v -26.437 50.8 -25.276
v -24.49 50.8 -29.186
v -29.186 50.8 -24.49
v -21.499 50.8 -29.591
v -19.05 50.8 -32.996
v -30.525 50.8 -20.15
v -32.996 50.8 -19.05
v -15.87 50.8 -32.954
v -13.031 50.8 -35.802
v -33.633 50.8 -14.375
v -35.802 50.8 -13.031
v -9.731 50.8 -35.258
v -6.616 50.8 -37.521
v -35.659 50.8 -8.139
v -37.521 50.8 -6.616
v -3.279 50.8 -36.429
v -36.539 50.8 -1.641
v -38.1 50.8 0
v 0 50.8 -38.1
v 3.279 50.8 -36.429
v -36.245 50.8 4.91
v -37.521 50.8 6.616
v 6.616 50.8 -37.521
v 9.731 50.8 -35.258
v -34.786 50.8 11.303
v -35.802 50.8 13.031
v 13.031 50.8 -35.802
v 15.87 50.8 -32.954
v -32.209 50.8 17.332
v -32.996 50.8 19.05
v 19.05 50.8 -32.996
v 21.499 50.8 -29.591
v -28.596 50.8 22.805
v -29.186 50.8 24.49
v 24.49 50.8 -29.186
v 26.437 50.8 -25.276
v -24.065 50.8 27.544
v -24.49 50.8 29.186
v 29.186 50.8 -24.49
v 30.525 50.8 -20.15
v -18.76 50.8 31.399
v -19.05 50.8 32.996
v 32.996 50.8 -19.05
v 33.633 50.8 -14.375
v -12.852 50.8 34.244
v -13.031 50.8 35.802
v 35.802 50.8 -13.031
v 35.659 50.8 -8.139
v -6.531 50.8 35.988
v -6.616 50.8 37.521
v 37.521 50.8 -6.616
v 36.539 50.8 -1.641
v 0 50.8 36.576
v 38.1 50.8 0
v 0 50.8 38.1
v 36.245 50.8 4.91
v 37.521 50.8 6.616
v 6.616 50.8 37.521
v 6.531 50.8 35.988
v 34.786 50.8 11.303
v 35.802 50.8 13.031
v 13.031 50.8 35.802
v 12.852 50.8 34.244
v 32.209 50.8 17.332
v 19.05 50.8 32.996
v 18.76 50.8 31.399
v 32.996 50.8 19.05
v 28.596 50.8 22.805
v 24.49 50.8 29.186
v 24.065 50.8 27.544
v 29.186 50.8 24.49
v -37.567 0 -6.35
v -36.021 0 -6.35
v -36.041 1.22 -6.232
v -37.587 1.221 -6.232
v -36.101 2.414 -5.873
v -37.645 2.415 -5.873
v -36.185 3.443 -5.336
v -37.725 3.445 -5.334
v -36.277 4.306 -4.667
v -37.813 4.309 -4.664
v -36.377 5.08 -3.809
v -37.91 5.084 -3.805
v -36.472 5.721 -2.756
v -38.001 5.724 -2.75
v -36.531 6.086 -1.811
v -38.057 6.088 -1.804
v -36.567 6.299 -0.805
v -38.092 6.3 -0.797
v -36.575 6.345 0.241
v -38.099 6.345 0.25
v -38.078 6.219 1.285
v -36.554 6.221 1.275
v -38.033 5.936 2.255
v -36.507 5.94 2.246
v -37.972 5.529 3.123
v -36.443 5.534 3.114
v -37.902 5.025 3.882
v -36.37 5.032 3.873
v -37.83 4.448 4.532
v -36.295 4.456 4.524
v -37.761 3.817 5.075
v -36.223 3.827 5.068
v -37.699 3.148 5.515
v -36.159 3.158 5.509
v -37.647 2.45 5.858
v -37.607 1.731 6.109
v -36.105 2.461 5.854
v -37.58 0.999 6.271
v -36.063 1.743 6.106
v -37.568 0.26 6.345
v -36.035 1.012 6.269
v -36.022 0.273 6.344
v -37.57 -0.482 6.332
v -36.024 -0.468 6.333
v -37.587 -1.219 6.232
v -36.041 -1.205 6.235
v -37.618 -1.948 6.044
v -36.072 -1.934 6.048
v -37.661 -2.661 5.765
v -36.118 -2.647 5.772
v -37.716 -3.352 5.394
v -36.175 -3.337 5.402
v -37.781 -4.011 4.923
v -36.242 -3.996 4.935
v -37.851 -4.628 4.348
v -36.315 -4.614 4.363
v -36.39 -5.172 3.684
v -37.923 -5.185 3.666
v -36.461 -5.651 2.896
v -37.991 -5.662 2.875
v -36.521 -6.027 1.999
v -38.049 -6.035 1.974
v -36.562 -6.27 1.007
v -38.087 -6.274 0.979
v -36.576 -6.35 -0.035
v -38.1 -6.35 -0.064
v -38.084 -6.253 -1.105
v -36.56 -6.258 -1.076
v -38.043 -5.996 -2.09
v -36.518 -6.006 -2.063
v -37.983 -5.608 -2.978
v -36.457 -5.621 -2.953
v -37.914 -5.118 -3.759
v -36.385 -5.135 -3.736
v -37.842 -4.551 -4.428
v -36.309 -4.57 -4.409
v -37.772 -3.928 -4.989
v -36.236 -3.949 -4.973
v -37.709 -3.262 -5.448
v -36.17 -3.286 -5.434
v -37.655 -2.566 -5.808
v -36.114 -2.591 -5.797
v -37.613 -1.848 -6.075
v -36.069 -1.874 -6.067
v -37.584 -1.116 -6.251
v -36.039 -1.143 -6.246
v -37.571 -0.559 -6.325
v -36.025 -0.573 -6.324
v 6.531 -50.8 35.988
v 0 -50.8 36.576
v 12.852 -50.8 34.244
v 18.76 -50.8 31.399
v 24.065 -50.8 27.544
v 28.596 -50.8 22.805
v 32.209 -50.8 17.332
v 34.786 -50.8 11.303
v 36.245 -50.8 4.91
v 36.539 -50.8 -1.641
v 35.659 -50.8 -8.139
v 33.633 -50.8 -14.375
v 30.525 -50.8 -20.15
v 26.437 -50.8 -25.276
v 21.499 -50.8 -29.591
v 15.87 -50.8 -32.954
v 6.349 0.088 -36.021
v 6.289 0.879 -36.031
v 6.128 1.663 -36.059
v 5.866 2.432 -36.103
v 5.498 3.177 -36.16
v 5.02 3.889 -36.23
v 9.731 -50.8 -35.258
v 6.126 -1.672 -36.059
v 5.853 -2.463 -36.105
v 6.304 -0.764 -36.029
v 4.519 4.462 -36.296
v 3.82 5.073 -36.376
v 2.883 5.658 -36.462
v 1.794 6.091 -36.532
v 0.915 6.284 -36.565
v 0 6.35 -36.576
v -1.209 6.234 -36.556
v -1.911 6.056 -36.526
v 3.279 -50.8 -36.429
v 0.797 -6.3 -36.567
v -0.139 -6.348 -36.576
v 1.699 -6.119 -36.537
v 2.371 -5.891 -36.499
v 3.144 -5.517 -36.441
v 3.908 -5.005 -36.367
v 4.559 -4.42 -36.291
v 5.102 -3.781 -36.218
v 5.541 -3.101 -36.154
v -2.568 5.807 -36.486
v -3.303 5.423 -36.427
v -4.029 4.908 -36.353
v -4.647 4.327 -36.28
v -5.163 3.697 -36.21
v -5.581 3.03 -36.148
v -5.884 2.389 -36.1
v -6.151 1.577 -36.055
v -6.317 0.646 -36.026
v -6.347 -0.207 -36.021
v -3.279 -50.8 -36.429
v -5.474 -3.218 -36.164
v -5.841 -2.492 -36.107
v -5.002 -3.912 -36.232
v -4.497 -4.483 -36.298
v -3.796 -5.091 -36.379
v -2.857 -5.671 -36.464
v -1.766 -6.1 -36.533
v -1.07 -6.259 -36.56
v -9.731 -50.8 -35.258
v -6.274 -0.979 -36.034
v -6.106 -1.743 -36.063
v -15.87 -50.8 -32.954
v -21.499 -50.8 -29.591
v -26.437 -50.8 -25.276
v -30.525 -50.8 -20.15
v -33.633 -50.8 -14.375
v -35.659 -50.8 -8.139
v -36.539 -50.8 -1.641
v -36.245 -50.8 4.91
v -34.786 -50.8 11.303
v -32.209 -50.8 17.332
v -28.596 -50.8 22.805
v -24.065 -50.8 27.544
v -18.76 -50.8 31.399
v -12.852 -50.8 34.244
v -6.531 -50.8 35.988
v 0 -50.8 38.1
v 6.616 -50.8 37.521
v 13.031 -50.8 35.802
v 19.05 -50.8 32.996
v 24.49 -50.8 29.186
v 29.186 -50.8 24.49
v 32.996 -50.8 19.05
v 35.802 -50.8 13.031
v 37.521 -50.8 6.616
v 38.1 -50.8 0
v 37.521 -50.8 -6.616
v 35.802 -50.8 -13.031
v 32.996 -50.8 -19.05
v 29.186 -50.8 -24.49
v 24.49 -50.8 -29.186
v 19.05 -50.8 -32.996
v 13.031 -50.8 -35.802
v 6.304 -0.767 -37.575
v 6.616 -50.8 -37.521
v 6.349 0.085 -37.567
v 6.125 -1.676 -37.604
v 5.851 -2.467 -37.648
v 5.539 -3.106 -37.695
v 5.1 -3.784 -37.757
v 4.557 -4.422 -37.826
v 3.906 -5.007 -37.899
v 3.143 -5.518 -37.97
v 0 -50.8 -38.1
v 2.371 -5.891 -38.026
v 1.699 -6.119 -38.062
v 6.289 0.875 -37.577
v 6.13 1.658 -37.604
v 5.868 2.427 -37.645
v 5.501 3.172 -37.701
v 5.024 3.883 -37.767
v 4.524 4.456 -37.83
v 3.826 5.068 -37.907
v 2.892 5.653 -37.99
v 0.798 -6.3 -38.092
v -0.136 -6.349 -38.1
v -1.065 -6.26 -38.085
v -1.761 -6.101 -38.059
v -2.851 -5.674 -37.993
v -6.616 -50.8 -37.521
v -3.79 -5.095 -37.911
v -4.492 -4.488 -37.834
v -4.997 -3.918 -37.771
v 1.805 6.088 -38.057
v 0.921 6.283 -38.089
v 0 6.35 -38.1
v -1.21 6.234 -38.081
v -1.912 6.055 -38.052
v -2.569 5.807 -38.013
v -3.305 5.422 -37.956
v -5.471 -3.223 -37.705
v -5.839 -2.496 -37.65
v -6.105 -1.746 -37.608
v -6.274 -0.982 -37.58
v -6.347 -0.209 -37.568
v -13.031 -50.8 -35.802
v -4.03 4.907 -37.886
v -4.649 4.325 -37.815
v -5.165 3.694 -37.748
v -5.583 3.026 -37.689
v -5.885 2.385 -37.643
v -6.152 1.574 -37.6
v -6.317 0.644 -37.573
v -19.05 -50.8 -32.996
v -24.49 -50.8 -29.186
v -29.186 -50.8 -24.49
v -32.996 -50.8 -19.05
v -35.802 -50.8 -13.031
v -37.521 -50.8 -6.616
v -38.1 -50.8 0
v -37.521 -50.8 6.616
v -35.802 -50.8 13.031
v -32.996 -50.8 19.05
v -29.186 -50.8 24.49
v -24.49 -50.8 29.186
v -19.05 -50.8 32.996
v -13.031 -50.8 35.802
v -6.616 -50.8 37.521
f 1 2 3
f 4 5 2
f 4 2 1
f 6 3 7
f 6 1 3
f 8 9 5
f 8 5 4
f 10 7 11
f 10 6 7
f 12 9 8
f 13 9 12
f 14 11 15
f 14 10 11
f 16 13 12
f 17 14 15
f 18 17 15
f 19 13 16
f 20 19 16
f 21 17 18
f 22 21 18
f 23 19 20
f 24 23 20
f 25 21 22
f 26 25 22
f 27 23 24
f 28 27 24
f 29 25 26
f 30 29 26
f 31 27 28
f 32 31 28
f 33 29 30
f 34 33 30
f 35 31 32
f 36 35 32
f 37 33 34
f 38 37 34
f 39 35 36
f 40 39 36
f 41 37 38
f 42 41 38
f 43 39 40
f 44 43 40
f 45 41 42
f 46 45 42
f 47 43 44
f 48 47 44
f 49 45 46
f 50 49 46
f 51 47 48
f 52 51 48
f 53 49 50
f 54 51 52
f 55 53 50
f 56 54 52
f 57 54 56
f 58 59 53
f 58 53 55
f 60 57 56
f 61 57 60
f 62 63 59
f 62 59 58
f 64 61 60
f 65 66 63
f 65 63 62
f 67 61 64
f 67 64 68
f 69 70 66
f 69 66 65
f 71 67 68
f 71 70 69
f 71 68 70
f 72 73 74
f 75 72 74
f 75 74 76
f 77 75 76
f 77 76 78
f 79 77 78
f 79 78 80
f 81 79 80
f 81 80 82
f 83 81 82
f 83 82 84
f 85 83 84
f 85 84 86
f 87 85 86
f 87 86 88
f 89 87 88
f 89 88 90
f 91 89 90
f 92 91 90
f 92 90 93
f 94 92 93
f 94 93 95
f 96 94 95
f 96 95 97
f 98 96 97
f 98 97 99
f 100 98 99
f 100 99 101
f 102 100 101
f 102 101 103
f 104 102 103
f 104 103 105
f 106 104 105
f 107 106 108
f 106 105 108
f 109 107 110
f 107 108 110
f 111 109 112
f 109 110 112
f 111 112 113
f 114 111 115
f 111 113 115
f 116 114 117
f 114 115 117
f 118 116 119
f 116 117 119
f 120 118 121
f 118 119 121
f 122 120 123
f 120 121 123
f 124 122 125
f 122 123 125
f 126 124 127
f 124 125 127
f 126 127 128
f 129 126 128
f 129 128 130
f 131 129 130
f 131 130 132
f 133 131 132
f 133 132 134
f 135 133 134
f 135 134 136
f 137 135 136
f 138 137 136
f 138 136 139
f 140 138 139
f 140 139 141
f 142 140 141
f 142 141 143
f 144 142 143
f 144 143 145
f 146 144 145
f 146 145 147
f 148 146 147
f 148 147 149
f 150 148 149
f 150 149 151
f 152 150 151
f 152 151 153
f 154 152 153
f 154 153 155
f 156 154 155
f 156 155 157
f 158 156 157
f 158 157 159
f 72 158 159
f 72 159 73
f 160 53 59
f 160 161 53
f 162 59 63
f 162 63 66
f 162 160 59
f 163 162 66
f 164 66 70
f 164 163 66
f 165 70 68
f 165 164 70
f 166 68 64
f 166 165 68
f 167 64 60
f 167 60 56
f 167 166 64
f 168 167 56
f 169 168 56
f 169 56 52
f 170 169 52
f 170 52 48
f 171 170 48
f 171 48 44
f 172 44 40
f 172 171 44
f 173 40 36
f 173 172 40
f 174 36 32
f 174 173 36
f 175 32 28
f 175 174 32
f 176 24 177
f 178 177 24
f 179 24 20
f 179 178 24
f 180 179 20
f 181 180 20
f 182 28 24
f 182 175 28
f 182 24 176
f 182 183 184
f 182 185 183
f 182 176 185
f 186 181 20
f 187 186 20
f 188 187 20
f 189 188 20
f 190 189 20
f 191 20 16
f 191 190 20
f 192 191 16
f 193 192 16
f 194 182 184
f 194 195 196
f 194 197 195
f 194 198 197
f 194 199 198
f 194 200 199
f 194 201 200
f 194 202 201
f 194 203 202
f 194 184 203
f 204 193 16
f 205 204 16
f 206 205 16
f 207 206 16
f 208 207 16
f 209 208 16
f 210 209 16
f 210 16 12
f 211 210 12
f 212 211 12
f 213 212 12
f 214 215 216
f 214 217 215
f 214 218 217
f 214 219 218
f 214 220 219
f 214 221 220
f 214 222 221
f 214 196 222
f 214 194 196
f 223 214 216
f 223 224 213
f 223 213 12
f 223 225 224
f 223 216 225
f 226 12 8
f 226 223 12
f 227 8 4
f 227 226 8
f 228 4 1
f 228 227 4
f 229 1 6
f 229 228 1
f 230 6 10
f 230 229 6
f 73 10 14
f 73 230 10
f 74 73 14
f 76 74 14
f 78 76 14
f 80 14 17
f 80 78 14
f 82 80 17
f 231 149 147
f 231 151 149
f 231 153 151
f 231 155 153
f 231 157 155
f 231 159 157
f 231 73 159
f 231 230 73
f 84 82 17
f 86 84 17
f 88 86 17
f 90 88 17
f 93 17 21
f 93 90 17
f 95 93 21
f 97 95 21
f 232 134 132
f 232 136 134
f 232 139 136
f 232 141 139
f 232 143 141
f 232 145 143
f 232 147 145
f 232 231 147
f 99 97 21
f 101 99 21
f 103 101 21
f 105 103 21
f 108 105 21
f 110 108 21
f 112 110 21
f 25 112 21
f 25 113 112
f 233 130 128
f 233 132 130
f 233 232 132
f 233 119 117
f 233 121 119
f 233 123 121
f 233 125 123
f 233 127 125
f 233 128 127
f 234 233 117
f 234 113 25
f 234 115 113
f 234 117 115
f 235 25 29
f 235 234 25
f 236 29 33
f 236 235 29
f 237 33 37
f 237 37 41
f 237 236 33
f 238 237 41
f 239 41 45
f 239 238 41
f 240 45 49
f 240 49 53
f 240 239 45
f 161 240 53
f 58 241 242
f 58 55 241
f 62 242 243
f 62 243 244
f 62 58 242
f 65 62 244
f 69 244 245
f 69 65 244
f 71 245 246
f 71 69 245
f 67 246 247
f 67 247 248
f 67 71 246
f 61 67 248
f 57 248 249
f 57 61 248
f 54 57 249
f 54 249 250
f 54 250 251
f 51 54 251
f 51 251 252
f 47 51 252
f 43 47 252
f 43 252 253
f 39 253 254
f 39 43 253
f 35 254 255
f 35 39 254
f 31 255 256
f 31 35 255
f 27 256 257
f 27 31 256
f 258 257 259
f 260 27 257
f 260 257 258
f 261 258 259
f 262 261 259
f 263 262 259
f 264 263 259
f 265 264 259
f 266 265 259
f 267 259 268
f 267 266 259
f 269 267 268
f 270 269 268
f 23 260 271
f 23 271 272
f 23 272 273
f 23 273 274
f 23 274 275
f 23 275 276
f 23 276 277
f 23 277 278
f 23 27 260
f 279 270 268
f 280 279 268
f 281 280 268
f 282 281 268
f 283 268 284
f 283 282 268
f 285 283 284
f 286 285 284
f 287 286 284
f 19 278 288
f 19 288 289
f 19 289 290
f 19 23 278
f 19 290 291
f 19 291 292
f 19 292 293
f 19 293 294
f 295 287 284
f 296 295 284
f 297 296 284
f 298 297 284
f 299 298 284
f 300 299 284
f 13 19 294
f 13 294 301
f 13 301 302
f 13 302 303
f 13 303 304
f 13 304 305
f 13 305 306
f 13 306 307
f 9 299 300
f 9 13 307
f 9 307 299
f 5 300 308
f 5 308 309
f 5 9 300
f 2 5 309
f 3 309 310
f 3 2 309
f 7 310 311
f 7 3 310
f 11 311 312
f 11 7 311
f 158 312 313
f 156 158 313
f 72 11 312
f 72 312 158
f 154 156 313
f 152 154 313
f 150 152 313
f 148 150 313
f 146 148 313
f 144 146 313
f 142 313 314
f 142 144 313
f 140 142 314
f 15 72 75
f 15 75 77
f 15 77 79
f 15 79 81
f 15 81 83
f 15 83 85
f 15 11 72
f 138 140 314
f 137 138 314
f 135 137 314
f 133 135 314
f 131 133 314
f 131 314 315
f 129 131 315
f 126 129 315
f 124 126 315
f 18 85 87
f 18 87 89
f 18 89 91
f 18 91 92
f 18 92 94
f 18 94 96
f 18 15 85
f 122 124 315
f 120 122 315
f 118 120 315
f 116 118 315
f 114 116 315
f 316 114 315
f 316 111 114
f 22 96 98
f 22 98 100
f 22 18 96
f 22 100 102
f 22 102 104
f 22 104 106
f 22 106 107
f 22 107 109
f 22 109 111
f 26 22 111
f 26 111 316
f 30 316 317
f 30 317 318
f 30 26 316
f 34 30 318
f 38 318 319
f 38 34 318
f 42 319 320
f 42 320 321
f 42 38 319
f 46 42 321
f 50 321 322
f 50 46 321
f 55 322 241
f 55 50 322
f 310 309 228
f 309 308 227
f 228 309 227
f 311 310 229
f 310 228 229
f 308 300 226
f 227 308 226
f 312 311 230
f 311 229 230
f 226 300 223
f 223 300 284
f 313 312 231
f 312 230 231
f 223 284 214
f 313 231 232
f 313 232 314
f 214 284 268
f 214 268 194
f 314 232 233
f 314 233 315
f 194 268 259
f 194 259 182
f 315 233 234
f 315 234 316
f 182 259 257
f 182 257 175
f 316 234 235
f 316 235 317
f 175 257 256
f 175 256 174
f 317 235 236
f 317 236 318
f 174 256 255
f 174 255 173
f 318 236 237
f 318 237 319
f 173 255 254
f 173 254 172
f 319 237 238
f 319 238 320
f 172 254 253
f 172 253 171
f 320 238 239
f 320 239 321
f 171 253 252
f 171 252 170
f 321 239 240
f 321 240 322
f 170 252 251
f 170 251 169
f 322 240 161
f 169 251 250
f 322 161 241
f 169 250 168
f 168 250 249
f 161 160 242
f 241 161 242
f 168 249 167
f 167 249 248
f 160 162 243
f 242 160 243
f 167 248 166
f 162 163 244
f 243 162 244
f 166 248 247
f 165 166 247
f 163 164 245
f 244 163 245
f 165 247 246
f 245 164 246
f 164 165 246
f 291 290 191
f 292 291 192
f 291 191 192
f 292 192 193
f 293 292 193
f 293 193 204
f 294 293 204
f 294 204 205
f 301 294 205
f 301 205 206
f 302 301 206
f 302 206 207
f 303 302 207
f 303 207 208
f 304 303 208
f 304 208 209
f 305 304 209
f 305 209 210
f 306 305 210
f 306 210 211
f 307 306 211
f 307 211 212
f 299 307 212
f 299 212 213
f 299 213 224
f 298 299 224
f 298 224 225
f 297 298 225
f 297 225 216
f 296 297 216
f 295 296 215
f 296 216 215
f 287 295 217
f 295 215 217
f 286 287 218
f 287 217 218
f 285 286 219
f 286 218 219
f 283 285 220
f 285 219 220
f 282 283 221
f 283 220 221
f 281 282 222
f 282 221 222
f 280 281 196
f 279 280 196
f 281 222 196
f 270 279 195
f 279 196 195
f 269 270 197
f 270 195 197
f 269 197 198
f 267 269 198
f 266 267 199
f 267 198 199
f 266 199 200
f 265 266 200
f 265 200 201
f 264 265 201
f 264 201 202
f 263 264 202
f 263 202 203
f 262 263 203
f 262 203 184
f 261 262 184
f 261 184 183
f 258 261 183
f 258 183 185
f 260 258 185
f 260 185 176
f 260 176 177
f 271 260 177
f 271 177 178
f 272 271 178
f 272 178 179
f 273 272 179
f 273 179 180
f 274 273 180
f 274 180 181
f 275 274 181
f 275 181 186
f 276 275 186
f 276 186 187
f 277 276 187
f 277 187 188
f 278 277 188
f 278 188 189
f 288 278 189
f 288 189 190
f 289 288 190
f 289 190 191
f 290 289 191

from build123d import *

# Parameters (mm, degrees)
SKETCH1_R           = 38.1
SKETCH1_R_2         = 36.576
BOSS_EXTRUDE1_DEPTH = 50.8
SKETCH2_R           = 6.35
CUT_EXTRUDE1_DEPTH  = 75.053089065
SKETCH3_R           = 6.35
CUT_EXTRUDE2_DEPTH  = 75.053089236


with BuildPart() as part:
    # Sketch1 → Boss-Extrude1 (new, symmetric)
    with BuildSketch(Plane(origin=(0, 0, 0), x_dir=(1, 0, 0), z_dir=(0, 1, 0))):
        with Locations(Location((0, 0, 0), (0, 0, 270))):
            Circle(SKETCH1_R)
        with Locations(Location((0, 0, 0), (0, 0, 270))):
            Circle(SKETCH1_R_2, mode=Mode.SUBTRACT)
    extrude(amount=BOSS_EXTRUDE1_DEPTH, both=True)

    # Sketch2 → Cut-Extrude1 (cut, through all)
    with BuildSketch(Plane(origin=(0, 0, 0), x_dir=(0, 0, -1), z_dir=(1, 0, 0))):
        Circle(SKETCH2_R)
    extrude(amount=-CUT_EXTRUDE1_DEPTH, mode=Mode.SUBTRACT)

    # Sketch3 → Cut-Extrude2 (cut, through all)
    with BuildSketch(Plane.XY):
        with Locations(Location((0, 0, 0), (0, 0, 90))):
            Circle(SKETCH3_R)
    extrude(amount=-CUT_EXTRUDE2_DEPTH, mode=Mode.SUBTRACT)


solid = part.part
